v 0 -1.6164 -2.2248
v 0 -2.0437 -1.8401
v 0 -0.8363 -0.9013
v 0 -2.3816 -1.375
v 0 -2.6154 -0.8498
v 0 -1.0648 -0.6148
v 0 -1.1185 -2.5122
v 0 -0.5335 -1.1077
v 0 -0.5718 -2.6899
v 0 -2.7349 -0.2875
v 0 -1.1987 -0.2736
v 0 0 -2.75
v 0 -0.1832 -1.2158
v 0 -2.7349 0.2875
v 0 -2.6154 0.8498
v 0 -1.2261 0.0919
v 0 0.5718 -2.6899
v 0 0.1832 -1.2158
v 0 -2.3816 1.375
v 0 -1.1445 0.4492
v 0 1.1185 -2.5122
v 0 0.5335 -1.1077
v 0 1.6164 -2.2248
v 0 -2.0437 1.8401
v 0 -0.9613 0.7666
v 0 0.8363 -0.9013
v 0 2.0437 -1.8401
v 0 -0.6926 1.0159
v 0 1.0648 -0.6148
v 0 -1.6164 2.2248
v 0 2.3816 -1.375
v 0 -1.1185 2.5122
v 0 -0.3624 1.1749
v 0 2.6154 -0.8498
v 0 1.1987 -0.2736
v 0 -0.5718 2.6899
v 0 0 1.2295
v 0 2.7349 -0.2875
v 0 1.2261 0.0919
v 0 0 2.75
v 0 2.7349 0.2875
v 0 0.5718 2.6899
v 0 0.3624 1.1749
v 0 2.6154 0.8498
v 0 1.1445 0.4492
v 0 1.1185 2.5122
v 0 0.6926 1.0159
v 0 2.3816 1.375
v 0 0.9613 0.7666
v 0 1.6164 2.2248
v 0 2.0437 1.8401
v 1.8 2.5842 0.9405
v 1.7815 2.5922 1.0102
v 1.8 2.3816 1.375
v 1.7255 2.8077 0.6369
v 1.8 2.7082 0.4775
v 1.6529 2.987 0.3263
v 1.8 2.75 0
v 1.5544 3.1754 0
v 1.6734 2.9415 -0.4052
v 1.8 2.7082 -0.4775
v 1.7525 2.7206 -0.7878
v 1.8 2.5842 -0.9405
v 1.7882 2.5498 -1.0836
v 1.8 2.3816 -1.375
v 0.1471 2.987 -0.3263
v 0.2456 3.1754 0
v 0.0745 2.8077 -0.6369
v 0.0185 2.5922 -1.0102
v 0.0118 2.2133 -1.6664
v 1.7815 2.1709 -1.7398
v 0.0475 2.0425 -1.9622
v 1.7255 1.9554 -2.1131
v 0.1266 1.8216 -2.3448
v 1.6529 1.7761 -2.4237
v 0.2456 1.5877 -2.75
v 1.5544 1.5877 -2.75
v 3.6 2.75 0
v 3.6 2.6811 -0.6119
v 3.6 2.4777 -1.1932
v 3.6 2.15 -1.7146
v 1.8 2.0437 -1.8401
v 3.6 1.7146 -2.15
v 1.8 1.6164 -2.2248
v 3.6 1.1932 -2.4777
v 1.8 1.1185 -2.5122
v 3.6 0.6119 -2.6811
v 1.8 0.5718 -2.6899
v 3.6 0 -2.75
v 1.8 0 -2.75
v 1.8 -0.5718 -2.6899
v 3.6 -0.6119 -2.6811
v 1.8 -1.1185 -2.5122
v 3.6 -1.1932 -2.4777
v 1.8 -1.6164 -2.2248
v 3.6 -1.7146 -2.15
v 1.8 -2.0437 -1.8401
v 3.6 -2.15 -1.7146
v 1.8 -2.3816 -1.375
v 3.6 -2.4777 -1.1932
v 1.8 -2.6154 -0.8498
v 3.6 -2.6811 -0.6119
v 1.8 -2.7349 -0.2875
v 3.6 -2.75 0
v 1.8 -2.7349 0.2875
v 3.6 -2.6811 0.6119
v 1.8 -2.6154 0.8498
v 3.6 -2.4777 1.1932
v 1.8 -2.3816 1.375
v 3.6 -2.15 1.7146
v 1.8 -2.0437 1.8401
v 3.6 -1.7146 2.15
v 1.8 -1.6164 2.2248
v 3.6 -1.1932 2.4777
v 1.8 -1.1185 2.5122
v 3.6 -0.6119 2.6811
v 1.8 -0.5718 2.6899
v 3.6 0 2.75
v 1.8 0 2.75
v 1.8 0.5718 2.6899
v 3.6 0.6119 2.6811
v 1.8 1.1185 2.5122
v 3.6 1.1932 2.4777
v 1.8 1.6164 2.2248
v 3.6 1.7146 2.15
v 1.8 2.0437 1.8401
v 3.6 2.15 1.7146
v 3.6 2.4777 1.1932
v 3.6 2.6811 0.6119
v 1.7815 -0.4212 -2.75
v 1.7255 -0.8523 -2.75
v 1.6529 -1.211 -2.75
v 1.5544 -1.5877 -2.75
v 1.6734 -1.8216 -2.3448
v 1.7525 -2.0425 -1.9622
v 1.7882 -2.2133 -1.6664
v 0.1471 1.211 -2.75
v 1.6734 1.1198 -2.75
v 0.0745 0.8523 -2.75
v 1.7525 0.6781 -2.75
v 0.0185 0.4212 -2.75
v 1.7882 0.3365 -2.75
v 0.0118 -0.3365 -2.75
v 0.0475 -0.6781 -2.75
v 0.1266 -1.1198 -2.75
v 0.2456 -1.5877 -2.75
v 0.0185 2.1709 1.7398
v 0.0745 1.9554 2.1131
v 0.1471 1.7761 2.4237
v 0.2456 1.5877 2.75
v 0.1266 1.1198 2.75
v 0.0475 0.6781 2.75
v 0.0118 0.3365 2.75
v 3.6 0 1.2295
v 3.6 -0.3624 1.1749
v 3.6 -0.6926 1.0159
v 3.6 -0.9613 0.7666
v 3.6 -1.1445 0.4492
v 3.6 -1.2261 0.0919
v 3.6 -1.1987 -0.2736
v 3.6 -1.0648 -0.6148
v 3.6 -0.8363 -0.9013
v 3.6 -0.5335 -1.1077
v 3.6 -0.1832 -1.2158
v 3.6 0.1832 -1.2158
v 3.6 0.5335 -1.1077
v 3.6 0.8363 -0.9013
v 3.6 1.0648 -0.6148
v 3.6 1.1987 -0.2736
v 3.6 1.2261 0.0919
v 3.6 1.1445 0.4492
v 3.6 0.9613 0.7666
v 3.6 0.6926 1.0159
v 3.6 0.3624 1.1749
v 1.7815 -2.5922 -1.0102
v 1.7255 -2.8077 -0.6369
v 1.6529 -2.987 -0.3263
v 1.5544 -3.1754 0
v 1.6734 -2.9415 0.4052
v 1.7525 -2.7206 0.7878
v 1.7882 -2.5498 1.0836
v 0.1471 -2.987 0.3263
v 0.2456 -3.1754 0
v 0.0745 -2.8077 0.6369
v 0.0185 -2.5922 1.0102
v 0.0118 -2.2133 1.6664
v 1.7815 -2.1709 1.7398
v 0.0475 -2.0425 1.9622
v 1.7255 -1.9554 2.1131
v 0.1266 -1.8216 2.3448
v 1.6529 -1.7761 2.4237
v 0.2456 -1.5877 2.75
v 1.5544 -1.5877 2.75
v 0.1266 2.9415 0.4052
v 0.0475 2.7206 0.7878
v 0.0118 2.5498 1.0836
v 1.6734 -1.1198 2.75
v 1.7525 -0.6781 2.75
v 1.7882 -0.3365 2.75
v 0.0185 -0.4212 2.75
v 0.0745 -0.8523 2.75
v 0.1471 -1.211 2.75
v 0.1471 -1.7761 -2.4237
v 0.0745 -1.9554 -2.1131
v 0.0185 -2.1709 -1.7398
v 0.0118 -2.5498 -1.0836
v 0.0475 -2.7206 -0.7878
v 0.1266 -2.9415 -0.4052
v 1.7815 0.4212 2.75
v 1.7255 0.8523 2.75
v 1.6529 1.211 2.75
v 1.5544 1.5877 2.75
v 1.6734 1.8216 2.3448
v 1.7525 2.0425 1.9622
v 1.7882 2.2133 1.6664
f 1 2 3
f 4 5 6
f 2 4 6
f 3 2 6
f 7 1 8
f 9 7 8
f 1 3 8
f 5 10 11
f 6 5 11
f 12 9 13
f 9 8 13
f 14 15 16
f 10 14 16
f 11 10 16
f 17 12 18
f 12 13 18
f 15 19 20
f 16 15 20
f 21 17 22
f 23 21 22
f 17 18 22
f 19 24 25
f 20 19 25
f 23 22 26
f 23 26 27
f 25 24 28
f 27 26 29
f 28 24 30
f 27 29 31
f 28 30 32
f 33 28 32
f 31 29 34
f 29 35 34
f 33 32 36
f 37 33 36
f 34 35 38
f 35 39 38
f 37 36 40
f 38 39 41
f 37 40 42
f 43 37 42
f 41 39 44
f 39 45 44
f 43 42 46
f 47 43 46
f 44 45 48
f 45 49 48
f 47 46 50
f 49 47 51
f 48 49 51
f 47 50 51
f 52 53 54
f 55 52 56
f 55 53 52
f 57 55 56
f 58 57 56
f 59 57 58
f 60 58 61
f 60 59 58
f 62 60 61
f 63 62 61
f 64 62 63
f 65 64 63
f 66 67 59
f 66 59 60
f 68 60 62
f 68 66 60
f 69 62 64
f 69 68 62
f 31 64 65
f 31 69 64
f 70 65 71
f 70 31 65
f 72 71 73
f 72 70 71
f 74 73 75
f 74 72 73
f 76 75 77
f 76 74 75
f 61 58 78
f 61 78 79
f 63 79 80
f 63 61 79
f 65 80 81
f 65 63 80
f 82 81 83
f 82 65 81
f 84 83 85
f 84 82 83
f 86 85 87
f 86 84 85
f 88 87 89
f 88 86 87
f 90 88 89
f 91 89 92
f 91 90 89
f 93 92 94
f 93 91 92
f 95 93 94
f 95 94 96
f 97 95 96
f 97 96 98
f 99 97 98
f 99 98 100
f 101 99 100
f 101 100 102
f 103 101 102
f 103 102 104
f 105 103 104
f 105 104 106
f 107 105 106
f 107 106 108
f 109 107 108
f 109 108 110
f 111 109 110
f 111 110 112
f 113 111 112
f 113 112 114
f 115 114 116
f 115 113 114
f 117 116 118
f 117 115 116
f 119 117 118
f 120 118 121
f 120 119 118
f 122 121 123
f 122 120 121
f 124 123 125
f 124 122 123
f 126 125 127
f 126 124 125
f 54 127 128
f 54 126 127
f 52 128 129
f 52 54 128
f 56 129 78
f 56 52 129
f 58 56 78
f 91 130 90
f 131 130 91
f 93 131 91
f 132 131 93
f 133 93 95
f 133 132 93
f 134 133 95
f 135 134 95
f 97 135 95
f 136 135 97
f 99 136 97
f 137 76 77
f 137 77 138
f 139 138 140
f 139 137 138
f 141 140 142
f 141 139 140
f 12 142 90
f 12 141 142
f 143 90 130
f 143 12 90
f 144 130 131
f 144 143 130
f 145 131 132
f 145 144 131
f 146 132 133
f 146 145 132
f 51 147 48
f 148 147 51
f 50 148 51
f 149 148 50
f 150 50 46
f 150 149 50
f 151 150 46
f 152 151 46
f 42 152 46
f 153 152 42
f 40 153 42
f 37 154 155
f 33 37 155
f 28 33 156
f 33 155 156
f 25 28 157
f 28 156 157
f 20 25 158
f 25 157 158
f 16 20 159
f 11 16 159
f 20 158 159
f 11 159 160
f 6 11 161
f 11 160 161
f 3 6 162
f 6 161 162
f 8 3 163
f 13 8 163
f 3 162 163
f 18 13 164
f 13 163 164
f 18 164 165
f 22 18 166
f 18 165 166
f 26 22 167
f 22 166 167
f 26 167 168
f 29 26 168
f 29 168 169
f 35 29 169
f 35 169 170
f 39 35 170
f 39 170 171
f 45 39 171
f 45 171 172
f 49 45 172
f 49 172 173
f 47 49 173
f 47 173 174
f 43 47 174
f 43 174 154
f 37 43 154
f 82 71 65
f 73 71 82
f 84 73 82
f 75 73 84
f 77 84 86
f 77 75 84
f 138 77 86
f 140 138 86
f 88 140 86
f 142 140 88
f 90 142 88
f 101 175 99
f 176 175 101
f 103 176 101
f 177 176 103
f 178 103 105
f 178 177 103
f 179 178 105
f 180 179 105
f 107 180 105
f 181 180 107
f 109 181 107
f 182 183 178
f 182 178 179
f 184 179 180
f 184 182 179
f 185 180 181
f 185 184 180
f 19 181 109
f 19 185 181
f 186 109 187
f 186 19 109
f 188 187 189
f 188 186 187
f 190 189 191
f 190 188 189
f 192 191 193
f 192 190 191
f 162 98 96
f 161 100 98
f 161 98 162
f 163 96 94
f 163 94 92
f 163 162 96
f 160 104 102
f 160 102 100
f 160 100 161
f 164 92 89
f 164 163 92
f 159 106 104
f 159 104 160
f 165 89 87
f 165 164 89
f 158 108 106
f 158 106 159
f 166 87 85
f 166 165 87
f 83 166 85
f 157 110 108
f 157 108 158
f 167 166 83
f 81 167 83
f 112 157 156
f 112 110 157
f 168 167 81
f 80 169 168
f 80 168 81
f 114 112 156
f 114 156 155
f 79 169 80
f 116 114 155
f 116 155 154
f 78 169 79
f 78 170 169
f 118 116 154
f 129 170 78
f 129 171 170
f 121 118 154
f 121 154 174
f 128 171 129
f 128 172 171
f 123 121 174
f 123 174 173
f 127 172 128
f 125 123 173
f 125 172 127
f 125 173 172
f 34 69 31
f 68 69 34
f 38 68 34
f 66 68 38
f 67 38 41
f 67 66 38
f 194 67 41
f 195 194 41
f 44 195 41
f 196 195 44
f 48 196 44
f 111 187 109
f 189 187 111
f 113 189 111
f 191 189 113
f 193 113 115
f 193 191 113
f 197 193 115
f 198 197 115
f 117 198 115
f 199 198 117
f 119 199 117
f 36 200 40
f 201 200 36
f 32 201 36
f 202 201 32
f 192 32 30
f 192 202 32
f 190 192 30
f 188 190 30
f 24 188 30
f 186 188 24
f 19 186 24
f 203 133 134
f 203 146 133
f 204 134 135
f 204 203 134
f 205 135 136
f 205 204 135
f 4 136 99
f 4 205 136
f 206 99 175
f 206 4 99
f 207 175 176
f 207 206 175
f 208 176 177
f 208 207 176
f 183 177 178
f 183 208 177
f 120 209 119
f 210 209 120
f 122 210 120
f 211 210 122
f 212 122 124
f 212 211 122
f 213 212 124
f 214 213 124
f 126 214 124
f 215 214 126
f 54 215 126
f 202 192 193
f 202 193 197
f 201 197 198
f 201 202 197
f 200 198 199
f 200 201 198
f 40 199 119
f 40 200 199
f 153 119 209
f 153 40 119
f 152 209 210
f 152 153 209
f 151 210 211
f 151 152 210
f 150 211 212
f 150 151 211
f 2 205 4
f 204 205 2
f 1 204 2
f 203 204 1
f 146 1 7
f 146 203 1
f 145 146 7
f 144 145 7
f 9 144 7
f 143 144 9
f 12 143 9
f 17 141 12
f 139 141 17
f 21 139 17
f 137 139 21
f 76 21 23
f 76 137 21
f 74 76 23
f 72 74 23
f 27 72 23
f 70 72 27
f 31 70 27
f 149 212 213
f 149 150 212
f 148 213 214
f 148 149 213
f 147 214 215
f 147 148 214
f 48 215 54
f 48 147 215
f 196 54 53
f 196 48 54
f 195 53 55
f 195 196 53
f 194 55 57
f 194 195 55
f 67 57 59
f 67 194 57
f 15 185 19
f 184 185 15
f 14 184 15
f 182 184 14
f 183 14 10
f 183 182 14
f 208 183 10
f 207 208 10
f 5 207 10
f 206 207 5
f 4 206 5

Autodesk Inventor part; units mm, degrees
ref_plane "YZ Plane" through (0, 0, 0) normal (1, 0, 0) x (0, 1, 0)
ref_plane "XZ Plane" through (0, 0, 0) normal (0, 1, 0) x (-1, 0, 0)
sketch "Szkic1" plane through (0, 0, 0) normal (1, 0, 0) x (0, 1, 0)
  line L0 (3.1754, 0) -> (1.5877, -2.75)
  line L1 (1.5877, -2.75) -> (-1.5877, -2.75)
  line L2 (-1.5877, -2.75) -> (-3.1754, 0)
  line L3 (-3.1754, 0) -> (-1.5877, 2.75)
  line L4 (-1.5877, 2.75) -> (1.5877, 2.75)
  line L5 (1.5877, 2.75) -> (3.1754, 0)
  point P0 (0, 0)
  point P1 (0, 0)
  dimension "d0" = 5.5
extrude "Głowica" add sketch "Szkic1" along normal blind 1.8
sketch "Szkic2" plane through (0, 0, 0) normal (0, 0, 1) x (1, 0, 0)
  line L0 (3.6, 0) -> (3.6, 2.75)
  line L1 (3.6, 2.75) -> (1.8, 2.75)
  line L2 (1.8, 0) -> (3.6, 0)
  line L3 (0, -0.55) -> (0, 3.3) projected
  line L4 (1.8, 0) -> (1.8, 2.75)
  line L5 (1.44, 0) -> (3.96, 0) projected
  dimension "d3" = 5.5
  dimension "d4" = 5.5
  dimension "d5" = 3.6
  dimension "d6" = 1.8
revolve "Bryła" add sketch "Szkic2" angle 360 about axis through (1.8, 0, 0) along (1, 0, 0)
sketch "Szkic3" plane through (0, 0, 0) normal (-1, 0, 0) x (0, 0, 1)
  point P0 (0, 0)
hole "Gwint" at (0, 0, 0) direction (1, 0, 0) diameter 2.459 end through all thread size "M3x0.5" class "6H" standard "ISO Metric profile"
sketch "Szkic4" plane through (0, 0, 0) normal (0, 0, 1) x (1, 0, 0)
  line L0 (1.8, 2.75) -> (1.8, 3.1754)
  line L1 (1.8, 3.1754) -> (1.5544, 3.1754)
  line L2 (1.5544, 3.1754) -> (1.8, 2.75)
  line L3 (0.2456, 3.1754) -> (0, 3.1754)
  line L4 (0, 3.1754) -> (0, 2.75)
  line L5 (0, 2.75) -> (0.2456, 3.1754)
  line L6 (1.8, 3.1754) -> (1.8, 2.3816) projected
  line L7 (0, 3.1754) -> (1.8, 3.1754) projected
  line L8 (0, 3.1754) -> (0, 1.5877) projected
  line L9 (-0.36, 0) -> (2.16, 0) projected
  dimension "d7" = 5.5
  dimension "d8" = 5.5
  dimension "d9" = 30
  dimension "d10" = 30
revolve "Faza1" cut sketch "Szkic4" angle 360 about axis through (-10, 0, 0) along (1, 0, 0)
ref_plane "Work Plane1" through (9.1402, 0, 0) normal (0, 0, -1) x (-1, 0, 0)
equation "\"d0\" = SW"
equation "\"d1\" = KOH1"
equation "\"d3\" = SW"
equation "\"d4\" = SW0"
equation "\"d5\" = KOH"
equation "\"d6\" = KOH1"
equation "\"d7\" = SW"
equation "\"d8\" = SW"
equation "\"d9\" = ANG1"
equation "\"d10\" = ANG2"
equation "\"SW\" = 5.5"
equation "\"KOH\" = 3.6"
equation "\"SW0\" = SW"
equation "\"ANG1\" = 30deg"
equation "\"ANG2\" = 30deg"
equation "\"KOH1\" = 1.8"
equation "\"GUL\" = 0.541266 * PTC"
equation "\"WFT\" = 0.4"
equation "\"PDM\" = 4.8"
equation "\"SDH\" = SW"
equation "\"TOA\" = 30deg"
equation "\"PTC\" = 0.5"
equation "\"NND\" = 3"
equation "\"THREADDIA\" = 3"
equation "\"GAL\" = 0.541266 * PTC"
equation "\"E0\" = 1.155 * SW"
properties part number "AS 1285 - M3" material "Stal, miękka"
